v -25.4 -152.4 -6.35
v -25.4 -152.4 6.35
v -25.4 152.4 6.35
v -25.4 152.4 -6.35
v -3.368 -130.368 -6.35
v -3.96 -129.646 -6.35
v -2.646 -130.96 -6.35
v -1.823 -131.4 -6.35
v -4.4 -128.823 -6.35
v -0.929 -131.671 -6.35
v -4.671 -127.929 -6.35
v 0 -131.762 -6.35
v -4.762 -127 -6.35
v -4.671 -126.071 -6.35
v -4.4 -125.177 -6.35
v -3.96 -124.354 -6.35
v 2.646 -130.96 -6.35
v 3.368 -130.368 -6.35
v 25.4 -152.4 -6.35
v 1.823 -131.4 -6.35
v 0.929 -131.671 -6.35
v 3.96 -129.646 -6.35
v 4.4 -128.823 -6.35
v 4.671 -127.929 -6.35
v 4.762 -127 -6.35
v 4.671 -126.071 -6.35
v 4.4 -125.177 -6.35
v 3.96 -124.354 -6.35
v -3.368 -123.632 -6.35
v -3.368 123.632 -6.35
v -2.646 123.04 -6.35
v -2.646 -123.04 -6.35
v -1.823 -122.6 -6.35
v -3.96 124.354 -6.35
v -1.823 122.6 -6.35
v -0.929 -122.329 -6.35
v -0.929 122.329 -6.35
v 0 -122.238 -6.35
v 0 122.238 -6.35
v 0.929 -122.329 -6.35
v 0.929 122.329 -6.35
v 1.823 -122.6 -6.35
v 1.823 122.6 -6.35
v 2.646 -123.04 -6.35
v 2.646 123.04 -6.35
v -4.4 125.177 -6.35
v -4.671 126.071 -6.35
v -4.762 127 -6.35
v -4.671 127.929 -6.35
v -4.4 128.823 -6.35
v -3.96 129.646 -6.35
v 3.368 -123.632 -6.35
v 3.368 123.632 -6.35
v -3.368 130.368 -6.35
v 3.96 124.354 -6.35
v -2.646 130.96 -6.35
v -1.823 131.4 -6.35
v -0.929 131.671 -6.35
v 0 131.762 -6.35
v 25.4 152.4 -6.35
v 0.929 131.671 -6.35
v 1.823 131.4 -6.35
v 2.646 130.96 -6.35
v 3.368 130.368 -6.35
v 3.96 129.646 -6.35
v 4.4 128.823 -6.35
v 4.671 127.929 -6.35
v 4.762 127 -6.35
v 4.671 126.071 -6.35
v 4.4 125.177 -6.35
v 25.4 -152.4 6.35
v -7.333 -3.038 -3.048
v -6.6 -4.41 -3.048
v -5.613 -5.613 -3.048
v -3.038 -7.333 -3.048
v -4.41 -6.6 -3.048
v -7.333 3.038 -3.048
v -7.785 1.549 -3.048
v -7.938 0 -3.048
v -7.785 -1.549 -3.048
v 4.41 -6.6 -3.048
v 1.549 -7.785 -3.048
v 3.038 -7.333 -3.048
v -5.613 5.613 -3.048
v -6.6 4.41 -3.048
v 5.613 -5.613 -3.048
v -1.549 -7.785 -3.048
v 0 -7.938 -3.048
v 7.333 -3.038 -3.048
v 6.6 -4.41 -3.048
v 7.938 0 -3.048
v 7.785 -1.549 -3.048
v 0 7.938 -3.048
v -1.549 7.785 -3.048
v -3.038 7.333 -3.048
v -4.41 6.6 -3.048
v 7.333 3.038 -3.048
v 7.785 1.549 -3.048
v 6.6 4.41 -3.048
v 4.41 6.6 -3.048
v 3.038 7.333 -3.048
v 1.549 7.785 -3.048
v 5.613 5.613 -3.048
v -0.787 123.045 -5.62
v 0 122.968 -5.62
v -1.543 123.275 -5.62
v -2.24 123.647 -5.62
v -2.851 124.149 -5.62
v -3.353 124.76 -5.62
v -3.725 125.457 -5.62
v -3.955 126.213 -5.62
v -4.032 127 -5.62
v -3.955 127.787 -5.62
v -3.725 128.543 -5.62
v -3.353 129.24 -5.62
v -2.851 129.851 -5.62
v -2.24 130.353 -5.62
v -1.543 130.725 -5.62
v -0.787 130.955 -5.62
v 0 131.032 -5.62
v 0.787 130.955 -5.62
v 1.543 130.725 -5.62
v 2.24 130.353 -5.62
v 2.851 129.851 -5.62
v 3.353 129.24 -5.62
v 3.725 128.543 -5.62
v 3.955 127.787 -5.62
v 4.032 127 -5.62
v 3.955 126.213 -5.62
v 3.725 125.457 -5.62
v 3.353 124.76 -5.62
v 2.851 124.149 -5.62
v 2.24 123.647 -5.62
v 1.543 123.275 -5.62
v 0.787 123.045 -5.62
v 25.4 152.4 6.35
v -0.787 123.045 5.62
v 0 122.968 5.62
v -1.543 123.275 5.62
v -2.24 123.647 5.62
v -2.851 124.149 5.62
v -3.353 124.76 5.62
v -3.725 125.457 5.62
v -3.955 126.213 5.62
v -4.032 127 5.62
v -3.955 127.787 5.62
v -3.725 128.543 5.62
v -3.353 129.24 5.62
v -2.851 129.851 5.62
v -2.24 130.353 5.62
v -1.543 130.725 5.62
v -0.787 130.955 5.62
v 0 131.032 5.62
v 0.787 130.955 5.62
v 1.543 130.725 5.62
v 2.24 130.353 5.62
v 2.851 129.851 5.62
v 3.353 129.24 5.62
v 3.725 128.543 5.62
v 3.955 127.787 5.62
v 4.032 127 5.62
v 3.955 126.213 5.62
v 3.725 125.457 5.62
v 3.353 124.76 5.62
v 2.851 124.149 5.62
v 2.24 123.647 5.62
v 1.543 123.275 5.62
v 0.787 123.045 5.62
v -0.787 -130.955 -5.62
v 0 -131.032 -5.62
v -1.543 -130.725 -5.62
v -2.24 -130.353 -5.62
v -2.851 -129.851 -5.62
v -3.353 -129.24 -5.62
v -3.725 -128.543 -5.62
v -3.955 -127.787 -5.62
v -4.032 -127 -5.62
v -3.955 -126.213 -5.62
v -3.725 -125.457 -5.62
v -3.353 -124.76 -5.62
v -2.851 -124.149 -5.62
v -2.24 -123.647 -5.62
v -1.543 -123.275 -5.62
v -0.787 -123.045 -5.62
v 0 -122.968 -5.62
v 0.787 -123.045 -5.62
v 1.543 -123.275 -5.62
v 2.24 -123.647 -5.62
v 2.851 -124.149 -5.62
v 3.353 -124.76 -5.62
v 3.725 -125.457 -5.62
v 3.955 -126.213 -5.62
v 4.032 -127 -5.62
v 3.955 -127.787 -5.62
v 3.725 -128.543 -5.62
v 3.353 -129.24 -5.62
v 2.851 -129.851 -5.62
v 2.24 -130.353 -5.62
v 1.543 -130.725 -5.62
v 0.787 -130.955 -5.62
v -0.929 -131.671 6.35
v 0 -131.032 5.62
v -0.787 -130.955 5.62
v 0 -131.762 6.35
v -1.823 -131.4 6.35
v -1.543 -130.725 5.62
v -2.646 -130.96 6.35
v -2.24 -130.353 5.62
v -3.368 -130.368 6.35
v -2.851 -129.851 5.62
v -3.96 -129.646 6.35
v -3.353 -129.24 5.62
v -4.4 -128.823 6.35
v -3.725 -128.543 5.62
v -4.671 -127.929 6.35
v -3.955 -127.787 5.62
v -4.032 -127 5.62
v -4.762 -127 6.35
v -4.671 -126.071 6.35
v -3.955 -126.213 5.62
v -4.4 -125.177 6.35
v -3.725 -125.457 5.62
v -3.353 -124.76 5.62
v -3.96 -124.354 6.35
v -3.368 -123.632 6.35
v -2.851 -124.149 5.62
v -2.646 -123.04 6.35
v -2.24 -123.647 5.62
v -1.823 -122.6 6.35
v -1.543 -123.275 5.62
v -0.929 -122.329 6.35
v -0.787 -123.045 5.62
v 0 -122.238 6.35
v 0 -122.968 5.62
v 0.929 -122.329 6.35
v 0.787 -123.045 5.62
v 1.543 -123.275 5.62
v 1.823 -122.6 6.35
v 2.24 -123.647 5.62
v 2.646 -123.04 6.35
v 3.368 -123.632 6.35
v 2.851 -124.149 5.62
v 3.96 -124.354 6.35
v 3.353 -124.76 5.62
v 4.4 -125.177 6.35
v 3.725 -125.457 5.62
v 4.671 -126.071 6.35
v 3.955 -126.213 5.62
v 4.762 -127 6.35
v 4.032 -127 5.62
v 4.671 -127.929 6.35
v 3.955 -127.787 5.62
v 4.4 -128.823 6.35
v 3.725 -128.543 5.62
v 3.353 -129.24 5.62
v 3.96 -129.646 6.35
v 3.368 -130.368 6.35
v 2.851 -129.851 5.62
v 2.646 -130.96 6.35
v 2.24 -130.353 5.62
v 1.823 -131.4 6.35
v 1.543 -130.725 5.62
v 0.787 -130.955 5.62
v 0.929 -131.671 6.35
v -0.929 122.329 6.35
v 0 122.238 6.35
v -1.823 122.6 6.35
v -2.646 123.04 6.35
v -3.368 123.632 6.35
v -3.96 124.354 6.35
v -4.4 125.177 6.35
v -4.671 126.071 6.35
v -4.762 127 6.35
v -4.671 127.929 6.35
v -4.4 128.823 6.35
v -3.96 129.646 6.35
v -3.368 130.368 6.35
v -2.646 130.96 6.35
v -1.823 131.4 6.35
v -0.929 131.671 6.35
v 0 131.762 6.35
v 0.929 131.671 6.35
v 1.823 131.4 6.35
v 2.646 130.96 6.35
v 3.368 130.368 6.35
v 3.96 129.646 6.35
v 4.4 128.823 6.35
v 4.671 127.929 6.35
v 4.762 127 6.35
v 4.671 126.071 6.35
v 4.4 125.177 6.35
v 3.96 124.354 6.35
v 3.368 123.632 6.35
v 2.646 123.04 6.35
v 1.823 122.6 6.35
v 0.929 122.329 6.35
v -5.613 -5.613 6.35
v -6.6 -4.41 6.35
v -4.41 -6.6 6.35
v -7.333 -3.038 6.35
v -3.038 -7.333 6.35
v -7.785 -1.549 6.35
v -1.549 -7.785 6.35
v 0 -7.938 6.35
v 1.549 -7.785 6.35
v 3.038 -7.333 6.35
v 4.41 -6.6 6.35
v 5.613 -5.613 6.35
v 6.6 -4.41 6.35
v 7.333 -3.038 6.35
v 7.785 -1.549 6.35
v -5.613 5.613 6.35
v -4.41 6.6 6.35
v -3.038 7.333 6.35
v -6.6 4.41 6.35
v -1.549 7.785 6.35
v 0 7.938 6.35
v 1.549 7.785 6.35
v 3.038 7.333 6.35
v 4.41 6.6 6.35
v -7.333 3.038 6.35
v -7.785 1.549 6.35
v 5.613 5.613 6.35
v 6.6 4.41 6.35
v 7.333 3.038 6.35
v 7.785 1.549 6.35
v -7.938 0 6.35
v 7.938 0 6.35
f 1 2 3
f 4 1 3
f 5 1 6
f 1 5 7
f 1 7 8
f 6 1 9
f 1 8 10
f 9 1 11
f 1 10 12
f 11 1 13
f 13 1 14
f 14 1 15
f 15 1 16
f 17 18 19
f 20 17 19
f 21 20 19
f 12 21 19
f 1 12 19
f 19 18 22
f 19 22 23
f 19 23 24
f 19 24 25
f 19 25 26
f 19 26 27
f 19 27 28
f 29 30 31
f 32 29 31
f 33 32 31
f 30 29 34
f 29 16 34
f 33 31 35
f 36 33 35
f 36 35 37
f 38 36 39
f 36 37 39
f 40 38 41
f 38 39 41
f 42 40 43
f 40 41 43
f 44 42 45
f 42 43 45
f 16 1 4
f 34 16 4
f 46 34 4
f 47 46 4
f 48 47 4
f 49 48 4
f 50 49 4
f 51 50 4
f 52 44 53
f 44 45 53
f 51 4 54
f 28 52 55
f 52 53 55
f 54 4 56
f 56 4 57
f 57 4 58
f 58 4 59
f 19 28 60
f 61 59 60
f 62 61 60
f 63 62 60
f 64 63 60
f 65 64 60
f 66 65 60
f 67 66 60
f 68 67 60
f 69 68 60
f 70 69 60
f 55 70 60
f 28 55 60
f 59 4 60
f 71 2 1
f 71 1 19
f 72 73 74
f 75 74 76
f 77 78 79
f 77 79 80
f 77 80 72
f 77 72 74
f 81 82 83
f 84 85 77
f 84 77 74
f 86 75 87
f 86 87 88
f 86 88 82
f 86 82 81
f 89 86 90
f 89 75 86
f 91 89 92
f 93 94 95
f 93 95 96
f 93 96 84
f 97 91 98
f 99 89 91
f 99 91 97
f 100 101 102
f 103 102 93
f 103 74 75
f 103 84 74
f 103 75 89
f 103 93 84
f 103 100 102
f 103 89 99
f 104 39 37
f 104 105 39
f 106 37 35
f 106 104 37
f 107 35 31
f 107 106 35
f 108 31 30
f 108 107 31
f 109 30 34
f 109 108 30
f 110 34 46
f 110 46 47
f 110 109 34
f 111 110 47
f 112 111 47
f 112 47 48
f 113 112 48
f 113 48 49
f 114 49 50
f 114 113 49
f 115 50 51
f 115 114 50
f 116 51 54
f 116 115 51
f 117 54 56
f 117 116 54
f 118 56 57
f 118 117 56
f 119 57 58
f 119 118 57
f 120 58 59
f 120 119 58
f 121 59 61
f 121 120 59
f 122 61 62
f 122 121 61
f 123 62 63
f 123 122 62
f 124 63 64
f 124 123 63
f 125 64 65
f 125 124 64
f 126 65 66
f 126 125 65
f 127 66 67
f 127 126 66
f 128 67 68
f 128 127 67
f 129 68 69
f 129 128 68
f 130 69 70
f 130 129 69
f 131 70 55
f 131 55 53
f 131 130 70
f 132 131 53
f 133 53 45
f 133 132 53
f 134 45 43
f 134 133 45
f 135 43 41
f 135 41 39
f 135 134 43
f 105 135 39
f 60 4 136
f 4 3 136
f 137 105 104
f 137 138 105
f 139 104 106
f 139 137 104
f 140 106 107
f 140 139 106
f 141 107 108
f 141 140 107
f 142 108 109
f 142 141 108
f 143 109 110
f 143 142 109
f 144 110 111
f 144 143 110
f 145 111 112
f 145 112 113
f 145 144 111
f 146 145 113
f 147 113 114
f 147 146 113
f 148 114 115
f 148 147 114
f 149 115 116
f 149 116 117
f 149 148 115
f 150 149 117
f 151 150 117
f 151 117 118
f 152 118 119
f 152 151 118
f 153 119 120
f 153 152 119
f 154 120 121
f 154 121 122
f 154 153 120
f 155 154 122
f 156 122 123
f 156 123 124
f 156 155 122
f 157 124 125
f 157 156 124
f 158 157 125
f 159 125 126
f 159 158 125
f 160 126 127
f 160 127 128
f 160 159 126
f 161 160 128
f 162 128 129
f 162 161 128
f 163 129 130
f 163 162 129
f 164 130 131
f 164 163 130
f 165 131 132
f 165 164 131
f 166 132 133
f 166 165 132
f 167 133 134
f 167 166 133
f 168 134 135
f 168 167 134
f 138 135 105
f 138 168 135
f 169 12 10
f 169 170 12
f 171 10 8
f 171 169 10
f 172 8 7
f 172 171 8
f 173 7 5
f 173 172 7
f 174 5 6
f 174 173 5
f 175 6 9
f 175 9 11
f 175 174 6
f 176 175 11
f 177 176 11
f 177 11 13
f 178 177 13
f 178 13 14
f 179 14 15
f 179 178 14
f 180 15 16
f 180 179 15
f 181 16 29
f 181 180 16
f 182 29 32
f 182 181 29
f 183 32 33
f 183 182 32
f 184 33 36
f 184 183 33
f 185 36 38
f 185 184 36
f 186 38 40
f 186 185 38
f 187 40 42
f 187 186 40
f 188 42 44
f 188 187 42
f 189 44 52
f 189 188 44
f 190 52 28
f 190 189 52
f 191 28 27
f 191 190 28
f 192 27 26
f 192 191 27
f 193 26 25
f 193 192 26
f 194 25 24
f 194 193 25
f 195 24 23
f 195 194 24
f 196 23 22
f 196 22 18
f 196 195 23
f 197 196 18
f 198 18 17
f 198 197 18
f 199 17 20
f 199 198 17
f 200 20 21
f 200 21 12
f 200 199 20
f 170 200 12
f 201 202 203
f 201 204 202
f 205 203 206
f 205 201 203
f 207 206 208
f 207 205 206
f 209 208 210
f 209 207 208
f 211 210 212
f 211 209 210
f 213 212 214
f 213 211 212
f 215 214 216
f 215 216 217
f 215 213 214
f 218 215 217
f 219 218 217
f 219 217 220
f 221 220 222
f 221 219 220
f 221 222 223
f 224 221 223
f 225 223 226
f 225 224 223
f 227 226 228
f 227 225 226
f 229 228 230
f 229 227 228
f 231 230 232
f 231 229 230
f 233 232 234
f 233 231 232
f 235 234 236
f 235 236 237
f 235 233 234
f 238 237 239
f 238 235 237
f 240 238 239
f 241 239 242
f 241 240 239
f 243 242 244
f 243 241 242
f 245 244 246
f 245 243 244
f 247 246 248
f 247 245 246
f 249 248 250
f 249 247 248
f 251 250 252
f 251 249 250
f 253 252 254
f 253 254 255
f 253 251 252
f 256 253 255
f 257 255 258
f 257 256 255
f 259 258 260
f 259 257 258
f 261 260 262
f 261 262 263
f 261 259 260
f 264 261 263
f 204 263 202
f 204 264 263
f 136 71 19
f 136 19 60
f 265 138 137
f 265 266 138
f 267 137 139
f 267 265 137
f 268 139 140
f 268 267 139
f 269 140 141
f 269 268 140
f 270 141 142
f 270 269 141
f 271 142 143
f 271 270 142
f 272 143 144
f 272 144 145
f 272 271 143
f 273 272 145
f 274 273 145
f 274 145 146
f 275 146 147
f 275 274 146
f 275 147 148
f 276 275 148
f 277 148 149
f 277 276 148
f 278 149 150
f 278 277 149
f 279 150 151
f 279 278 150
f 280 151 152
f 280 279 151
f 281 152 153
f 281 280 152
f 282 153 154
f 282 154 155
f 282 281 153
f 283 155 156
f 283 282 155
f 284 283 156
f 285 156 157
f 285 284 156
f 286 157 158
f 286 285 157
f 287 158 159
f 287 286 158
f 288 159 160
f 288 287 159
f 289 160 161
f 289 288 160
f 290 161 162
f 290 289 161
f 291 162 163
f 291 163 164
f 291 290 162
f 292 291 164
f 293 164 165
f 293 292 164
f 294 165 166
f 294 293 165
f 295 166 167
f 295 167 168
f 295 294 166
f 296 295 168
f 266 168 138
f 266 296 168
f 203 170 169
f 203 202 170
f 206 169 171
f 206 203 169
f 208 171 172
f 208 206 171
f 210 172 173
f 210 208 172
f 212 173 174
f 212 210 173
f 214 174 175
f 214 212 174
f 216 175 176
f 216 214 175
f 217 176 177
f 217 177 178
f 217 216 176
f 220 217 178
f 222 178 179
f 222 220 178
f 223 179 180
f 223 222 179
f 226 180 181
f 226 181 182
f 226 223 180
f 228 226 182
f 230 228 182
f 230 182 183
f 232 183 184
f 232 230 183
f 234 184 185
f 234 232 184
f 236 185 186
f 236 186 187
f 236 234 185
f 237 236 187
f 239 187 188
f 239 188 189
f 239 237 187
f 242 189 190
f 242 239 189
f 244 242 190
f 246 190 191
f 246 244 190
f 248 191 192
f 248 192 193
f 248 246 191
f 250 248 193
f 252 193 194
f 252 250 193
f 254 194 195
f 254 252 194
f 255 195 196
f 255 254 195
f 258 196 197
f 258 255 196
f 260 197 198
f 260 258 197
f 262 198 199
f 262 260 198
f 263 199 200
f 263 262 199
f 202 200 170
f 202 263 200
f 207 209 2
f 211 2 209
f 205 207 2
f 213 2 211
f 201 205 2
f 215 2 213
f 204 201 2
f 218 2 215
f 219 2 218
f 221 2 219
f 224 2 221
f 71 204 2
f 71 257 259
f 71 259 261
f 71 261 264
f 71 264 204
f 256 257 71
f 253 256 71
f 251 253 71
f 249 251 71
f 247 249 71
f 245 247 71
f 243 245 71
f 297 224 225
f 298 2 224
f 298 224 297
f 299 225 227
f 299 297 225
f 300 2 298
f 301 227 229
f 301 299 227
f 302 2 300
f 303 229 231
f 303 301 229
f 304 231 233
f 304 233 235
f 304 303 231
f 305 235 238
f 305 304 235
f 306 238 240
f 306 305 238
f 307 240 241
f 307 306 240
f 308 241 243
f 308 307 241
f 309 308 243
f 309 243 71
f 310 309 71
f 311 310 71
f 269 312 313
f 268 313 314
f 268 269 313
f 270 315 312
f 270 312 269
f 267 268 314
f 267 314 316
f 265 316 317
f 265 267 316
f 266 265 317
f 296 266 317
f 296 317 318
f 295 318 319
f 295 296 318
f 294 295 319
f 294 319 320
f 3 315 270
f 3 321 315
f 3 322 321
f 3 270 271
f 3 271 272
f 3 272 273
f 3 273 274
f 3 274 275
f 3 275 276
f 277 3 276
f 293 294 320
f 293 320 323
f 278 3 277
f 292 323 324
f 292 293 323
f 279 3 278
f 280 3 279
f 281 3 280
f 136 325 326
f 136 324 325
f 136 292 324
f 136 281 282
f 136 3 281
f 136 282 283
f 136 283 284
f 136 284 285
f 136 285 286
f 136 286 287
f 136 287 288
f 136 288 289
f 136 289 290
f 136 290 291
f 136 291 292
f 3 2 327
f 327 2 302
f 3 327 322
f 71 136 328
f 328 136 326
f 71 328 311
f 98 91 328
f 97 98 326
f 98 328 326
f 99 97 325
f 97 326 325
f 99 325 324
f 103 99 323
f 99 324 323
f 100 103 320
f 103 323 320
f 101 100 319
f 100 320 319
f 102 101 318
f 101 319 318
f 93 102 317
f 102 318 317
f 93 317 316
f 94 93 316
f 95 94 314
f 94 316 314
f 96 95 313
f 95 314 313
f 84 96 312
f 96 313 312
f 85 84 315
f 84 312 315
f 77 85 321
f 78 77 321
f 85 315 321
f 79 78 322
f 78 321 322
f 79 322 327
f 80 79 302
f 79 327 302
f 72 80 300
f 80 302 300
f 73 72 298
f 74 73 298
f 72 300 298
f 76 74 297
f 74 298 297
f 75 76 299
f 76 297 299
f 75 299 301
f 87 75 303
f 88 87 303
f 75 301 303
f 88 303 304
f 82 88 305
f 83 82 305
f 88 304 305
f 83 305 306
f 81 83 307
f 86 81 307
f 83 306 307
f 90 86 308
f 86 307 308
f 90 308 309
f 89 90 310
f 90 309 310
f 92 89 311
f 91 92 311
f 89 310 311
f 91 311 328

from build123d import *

# Parameters (mm, degrees)
SKETCH1_W_MOCK_PCB_W             = 50.8
SKETCH1_W_MOCK_PCB_H             = 304.8
BOSS_EXTRUDE1_DEPTH              = 6.35
F_3_8_16_TAPPED_HOLE1_AT_2_COUNT = 2
F_3_8_16_TAPPED_HOLE1_AT_2_PITCH = 254
SKETCH3_R                        = 7.9375
CUT_EXTRUDE1_DEPTH               = 9.398


with BuildPart() as part:
    # Sketch1 w/mock PCB → Boss-Extrude1 (new body, symmetric)
    with BuildSketch(Plane.XY):
        Rectangle(SKETCH1_W_MOCK_PCB_W, SKETCH1_W_MOCK_PCB_H)
    extrude(amount=BOSS_EXTRUDE1_DEPTH, both=True)

    # Sketch1 → 3/8-16 Tapped Hole1 (revolve, cut)
    with BuildSketch(Plane(origin=(0, -127, 6.35), x_dir=(0, -1, 0), z_dir=(1, 0, 0))):
        Polygon((0, 0), (0, 12.7), (4.7625, 12.7), (4.03225, 11.96975), (4.03225, 0.73025), (4.7625, 0), align=None)
    f_3_8_16_tapped_hole1 = revolve(axis=Axis((0, -127, 12.7), (0, 0, -1)), mode=Mode.SUBTRACT)

    # 3/8-16 Tapped Hole1 at 2: 3/8-16 Tapped Hole1 ×2
    with Locations(*[(0, i * F_3_8_16_TAPPED_HOLE1_AT_2_PITCH, 0) for i in range(1, F_3_8_16_TAPPED_HOLE1_AT_2_COUNT)]):
        add(f_3_8_16_tapped_hole1, mode=Mode.SUBTRACT)

    # Sketch3 → Cut-Extrude1 (cut)
    with BuildSketch(Plane.XY.offset(6.35)):
        Circle(SKETCH3_R)
    extrude(amount=-CUT_EXTRUDE1_DEPTH, mode=Mode.SUBTRACT)


solid = part.part
